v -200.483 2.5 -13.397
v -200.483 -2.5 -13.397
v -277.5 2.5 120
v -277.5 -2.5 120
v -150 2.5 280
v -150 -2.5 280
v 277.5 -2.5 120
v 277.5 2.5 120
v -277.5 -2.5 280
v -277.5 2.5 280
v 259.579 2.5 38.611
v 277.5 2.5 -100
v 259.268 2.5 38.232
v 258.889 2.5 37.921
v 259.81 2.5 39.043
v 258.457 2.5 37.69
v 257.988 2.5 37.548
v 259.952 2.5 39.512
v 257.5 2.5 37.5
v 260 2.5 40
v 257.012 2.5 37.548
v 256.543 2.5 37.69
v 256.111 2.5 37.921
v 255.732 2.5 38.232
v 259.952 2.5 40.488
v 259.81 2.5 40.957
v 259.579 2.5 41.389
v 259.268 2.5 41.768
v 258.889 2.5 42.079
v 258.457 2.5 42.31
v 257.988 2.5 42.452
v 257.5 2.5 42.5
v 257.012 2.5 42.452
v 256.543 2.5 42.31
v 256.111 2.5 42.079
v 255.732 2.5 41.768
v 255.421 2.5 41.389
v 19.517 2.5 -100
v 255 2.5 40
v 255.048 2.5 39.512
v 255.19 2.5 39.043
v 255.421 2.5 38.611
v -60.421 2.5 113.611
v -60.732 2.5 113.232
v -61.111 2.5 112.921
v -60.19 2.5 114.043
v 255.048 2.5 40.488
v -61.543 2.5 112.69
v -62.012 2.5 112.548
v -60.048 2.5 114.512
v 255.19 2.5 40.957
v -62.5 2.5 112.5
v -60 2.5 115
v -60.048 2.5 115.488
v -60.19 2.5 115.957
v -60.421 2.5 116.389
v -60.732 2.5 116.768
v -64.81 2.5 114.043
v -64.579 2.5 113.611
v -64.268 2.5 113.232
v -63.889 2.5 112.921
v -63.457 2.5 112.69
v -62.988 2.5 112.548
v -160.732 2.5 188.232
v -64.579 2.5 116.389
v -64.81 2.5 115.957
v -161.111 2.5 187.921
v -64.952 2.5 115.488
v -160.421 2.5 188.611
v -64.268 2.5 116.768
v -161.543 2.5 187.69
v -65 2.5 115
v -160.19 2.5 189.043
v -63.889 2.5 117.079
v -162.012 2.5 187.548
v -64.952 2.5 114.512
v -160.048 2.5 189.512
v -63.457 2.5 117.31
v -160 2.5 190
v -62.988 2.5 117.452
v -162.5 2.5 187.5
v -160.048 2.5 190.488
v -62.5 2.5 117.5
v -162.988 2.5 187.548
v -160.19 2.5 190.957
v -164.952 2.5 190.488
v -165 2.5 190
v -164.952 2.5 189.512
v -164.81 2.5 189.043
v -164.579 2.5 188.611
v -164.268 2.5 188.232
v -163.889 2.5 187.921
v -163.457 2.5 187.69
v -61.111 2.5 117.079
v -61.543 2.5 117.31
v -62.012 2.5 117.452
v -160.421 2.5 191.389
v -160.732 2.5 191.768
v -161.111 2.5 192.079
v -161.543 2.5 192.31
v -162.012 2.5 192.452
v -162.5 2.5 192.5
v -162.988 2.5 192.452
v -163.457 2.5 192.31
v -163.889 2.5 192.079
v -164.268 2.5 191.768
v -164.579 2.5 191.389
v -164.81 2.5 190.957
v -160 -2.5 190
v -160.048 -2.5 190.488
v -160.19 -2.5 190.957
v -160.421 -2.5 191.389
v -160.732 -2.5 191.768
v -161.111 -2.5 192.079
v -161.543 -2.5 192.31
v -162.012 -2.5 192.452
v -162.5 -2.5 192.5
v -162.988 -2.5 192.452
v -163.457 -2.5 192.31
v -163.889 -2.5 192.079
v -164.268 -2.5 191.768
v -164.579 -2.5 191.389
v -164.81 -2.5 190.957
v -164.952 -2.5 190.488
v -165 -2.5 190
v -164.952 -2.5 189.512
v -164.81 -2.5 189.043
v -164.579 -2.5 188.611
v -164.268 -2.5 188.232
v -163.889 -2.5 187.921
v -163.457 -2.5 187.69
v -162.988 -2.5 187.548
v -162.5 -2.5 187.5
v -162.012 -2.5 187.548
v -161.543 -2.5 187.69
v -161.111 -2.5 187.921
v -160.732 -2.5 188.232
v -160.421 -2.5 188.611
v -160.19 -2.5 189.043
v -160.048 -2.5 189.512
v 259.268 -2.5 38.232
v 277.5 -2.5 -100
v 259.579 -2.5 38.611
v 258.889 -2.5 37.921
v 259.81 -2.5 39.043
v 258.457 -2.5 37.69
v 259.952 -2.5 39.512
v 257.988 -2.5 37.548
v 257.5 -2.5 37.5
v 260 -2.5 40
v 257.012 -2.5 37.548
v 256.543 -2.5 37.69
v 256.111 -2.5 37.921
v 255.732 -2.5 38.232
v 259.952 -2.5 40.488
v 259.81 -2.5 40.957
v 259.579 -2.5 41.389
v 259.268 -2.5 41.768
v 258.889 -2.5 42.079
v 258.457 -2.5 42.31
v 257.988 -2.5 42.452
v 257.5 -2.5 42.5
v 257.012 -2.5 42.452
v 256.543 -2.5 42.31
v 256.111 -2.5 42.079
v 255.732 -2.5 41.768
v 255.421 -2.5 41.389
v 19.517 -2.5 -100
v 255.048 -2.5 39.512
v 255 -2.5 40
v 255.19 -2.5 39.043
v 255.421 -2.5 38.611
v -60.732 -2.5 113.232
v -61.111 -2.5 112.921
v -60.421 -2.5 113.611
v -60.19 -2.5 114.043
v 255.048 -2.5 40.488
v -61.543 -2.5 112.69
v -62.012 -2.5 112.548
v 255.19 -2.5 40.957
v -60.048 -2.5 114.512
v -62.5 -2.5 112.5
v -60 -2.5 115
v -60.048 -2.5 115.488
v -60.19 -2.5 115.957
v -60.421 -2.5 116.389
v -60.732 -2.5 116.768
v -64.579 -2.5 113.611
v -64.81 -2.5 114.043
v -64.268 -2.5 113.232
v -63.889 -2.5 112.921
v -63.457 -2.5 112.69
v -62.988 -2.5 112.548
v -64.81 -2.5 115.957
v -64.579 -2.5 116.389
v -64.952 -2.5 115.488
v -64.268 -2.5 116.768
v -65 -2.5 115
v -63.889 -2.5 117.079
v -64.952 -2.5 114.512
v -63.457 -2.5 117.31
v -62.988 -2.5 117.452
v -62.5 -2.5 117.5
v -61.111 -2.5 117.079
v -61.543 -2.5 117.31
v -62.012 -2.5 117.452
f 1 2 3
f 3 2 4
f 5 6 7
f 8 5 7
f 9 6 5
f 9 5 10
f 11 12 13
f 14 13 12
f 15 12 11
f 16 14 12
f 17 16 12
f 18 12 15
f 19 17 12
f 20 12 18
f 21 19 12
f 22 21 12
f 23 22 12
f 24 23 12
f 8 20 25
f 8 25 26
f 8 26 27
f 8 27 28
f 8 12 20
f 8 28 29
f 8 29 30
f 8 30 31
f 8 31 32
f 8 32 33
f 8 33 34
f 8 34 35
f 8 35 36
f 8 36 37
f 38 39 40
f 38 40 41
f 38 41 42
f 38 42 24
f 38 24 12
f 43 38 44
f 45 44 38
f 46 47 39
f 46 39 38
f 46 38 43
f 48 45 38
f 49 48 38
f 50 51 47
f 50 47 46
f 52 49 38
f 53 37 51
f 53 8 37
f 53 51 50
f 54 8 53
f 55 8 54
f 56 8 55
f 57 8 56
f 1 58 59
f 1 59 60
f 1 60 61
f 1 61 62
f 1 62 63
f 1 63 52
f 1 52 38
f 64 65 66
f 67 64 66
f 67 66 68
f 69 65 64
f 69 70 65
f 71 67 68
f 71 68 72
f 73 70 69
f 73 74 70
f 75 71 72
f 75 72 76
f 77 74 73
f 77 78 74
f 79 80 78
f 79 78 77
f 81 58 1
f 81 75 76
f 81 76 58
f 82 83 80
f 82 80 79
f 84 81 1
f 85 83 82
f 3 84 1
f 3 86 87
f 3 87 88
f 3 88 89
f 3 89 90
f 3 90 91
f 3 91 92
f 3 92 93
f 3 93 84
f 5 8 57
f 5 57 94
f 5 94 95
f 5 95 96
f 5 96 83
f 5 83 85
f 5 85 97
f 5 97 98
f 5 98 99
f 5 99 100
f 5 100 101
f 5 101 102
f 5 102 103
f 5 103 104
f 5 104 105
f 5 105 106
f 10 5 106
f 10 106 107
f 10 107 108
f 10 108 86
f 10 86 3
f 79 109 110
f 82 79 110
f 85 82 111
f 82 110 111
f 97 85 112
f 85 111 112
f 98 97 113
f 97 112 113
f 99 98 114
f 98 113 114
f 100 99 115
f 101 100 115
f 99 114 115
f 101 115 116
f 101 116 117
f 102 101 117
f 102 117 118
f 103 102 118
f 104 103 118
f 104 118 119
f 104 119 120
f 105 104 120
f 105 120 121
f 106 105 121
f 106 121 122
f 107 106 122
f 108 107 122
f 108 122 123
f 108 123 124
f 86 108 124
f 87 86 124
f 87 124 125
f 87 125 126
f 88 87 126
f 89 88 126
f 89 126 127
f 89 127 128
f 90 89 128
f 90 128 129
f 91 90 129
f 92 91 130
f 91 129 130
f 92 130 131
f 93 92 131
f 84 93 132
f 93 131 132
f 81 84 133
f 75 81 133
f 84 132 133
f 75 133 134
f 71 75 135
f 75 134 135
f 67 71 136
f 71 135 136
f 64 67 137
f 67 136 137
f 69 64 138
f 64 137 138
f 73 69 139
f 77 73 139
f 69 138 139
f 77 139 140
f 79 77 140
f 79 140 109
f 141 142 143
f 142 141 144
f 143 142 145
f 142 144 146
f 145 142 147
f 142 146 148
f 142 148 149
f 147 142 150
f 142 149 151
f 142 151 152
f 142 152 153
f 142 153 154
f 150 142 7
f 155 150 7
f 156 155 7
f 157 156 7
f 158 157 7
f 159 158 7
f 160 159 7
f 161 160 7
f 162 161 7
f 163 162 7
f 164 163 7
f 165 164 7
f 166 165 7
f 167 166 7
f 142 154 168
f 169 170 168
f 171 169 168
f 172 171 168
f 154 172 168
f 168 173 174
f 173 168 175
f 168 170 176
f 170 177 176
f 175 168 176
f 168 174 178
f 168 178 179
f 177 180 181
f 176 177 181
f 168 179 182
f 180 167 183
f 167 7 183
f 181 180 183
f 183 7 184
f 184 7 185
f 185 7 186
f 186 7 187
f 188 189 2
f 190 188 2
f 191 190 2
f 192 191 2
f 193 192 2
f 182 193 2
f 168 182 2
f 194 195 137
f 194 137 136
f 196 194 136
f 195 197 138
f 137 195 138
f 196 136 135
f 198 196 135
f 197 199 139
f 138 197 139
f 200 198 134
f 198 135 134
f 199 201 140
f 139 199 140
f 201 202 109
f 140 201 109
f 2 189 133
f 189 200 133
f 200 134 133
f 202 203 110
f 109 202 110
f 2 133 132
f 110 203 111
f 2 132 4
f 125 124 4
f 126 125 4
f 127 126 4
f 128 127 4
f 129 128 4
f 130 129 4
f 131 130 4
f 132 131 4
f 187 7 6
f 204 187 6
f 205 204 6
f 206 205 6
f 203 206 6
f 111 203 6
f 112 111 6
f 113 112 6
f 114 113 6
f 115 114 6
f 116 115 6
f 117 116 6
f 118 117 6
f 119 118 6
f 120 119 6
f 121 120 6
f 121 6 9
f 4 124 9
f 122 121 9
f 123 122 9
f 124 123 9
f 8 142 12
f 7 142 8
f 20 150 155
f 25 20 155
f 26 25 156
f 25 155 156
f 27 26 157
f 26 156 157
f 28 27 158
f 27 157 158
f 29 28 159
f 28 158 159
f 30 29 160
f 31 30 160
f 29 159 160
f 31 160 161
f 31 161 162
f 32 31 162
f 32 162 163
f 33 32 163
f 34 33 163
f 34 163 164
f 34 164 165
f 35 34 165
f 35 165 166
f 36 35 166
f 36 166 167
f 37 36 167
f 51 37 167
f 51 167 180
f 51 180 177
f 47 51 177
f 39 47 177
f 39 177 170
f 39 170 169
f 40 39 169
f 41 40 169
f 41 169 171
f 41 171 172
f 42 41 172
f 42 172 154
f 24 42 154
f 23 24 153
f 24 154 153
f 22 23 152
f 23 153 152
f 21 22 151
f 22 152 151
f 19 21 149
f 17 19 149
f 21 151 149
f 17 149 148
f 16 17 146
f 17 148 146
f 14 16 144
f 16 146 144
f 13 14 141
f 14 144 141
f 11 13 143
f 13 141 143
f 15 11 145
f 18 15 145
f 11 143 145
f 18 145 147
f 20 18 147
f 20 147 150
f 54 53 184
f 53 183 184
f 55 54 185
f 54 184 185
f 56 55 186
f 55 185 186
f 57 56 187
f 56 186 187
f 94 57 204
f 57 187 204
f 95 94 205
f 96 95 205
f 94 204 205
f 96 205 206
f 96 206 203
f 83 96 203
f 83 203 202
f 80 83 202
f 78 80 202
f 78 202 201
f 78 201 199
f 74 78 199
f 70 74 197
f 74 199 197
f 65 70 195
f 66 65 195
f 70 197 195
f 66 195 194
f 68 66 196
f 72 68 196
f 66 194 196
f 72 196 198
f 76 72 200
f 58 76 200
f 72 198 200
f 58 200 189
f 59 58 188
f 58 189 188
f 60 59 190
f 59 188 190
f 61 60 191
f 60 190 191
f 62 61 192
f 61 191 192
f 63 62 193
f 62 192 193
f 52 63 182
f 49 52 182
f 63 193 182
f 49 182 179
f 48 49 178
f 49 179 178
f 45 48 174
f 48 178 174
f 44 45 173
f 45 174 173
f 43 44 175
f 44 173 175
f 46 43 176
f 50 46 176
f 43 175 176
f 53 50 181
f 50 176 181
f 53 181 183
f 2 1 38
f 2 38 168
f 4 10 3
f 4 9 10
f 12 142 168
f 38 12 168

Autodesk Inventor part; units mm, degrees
ref_plane "YZ Plane" through (0, 0, 0) normal (1, 0, 0) x (0, 1, 0)
ref_plane "XZ Plane" through (0, 0, 0) normal (0, 1, 0) x (-1, 0, 0)
ref_plane "XY Plane" through (0, 0, 0) normal (0, 0, 1) x (1, 0, 0)
sketch "スケッチ1" plane through (0, 0, 0) normal (0, 1, 0) x (-1, 0, 0)
  line L0 (-277.5, 280) -> (277.5, 280)
  line L1 (277.5, 280) -> (277.5, -280)
  line L2 (277.5, -280) -> (-277.5, -280)
  line L3 (-277.5, -280) -> (-277.5, 280)
  line L4 (-277.5, 280) -> (277.5, -280) construction
  line L5 (277.5, 280) -> (-277.5, -280) construction
  point P0 (0, 0)
  dimension "d0" = 555
  dimension "d1" = 560
extrude "押し出し1" add sketch "スケッチ1" along normal mid plane 5
sketch "スケッチ3" plane through (0, -2.5, 0) normal (0, -1, 0) x (1, 0, 0)
  circle A0 centre (-62.5, 115) radius 2.5
  line L0 (277.5, -280) -> (277.5, 280) projected
  line L1 (-277.5, -280) -> (277.5, -280) projected
  circle A1 centre (-162.5, 190) radius 2.5
  circle A2 centre (257.5, 40) radius 2.5
  point P0 (0, 0)
  dimension "d10" = 5
  dimension "d15" = 5
  dimension "d16" = 320
  dimension "d17" = 20
  dimension "d18" = 5
  dimension "d24" = 75
  dimension "d25" = 320
  dimension "d26" = 420
  dimension "d27" = 150
extrude "押し出し4" cut sketch "スケッチ3" against normal through all
sketch "スケッチ5" plane through (0, -2.5, 0) normal (0, -1, 0) x (1, 0, 0)
  line L0 (277.5, 250) -> (-277.5, 250)
  line L1 (-250, 280) -> (-250, -280) construction
  line L2 (-277.5, -250) -> (277.5, -250)
  line L3 (250, -280) -> (250, 280) construction
  line L4 (-277.5, 280) -> (277.5, 280)
  line L5 (-150, 280) -> (277.5, 120)
  line L6 (277.5, 280) -> (277.5, -280)
  line L7 (-277.5, -280) -> (-277.5, 280)
  line L8 (-277.5, 120) -> (-150.482941, -100)
  line L9 (-150.482941, -100) -> (277.5, -100)
  line L10 (277.5, -280) -> (277.5, 280)
  point P0 (0, 0)
  dimension "d32" = 100
  dimension "d33" = 130
  dimension "d34" = 350
  dimension "d35" = 60
  dimension "d46" = 220
sketch "スケッチ5 outline for 押し出し5" plane through (0, -2.5, 0) normal (0, -1, 0) x (1, 0, 0)
  line L0 (277.5, 120) -> (277.5, 280)
  line L1 (-150, 280) -> (277.5, 120)
  line L2 (277.5, 280) -> (-150, 280)
  line L3 (-277.5, 120) -> (-277.5, -280)
  line L4 (-150.482941, -100) -> (-277.5, 120)
  line L5 (277.5, -100) -> (-150.482941, -100)
  line L6 (277.5, -280) -> (277.5, -100)
  line L7 (-277.5, -280) -> (277.5, -280)
extrude "押し出し5" cut sketch "スケッチ5 outline for 押し出し5" against normal through all
chamfer "面取り2" distance 170 distance2 100 1 edges at (-150.4829, 0, -100) measured on face at (134.839, -0.8333, -100)
properties part number "endplate"
